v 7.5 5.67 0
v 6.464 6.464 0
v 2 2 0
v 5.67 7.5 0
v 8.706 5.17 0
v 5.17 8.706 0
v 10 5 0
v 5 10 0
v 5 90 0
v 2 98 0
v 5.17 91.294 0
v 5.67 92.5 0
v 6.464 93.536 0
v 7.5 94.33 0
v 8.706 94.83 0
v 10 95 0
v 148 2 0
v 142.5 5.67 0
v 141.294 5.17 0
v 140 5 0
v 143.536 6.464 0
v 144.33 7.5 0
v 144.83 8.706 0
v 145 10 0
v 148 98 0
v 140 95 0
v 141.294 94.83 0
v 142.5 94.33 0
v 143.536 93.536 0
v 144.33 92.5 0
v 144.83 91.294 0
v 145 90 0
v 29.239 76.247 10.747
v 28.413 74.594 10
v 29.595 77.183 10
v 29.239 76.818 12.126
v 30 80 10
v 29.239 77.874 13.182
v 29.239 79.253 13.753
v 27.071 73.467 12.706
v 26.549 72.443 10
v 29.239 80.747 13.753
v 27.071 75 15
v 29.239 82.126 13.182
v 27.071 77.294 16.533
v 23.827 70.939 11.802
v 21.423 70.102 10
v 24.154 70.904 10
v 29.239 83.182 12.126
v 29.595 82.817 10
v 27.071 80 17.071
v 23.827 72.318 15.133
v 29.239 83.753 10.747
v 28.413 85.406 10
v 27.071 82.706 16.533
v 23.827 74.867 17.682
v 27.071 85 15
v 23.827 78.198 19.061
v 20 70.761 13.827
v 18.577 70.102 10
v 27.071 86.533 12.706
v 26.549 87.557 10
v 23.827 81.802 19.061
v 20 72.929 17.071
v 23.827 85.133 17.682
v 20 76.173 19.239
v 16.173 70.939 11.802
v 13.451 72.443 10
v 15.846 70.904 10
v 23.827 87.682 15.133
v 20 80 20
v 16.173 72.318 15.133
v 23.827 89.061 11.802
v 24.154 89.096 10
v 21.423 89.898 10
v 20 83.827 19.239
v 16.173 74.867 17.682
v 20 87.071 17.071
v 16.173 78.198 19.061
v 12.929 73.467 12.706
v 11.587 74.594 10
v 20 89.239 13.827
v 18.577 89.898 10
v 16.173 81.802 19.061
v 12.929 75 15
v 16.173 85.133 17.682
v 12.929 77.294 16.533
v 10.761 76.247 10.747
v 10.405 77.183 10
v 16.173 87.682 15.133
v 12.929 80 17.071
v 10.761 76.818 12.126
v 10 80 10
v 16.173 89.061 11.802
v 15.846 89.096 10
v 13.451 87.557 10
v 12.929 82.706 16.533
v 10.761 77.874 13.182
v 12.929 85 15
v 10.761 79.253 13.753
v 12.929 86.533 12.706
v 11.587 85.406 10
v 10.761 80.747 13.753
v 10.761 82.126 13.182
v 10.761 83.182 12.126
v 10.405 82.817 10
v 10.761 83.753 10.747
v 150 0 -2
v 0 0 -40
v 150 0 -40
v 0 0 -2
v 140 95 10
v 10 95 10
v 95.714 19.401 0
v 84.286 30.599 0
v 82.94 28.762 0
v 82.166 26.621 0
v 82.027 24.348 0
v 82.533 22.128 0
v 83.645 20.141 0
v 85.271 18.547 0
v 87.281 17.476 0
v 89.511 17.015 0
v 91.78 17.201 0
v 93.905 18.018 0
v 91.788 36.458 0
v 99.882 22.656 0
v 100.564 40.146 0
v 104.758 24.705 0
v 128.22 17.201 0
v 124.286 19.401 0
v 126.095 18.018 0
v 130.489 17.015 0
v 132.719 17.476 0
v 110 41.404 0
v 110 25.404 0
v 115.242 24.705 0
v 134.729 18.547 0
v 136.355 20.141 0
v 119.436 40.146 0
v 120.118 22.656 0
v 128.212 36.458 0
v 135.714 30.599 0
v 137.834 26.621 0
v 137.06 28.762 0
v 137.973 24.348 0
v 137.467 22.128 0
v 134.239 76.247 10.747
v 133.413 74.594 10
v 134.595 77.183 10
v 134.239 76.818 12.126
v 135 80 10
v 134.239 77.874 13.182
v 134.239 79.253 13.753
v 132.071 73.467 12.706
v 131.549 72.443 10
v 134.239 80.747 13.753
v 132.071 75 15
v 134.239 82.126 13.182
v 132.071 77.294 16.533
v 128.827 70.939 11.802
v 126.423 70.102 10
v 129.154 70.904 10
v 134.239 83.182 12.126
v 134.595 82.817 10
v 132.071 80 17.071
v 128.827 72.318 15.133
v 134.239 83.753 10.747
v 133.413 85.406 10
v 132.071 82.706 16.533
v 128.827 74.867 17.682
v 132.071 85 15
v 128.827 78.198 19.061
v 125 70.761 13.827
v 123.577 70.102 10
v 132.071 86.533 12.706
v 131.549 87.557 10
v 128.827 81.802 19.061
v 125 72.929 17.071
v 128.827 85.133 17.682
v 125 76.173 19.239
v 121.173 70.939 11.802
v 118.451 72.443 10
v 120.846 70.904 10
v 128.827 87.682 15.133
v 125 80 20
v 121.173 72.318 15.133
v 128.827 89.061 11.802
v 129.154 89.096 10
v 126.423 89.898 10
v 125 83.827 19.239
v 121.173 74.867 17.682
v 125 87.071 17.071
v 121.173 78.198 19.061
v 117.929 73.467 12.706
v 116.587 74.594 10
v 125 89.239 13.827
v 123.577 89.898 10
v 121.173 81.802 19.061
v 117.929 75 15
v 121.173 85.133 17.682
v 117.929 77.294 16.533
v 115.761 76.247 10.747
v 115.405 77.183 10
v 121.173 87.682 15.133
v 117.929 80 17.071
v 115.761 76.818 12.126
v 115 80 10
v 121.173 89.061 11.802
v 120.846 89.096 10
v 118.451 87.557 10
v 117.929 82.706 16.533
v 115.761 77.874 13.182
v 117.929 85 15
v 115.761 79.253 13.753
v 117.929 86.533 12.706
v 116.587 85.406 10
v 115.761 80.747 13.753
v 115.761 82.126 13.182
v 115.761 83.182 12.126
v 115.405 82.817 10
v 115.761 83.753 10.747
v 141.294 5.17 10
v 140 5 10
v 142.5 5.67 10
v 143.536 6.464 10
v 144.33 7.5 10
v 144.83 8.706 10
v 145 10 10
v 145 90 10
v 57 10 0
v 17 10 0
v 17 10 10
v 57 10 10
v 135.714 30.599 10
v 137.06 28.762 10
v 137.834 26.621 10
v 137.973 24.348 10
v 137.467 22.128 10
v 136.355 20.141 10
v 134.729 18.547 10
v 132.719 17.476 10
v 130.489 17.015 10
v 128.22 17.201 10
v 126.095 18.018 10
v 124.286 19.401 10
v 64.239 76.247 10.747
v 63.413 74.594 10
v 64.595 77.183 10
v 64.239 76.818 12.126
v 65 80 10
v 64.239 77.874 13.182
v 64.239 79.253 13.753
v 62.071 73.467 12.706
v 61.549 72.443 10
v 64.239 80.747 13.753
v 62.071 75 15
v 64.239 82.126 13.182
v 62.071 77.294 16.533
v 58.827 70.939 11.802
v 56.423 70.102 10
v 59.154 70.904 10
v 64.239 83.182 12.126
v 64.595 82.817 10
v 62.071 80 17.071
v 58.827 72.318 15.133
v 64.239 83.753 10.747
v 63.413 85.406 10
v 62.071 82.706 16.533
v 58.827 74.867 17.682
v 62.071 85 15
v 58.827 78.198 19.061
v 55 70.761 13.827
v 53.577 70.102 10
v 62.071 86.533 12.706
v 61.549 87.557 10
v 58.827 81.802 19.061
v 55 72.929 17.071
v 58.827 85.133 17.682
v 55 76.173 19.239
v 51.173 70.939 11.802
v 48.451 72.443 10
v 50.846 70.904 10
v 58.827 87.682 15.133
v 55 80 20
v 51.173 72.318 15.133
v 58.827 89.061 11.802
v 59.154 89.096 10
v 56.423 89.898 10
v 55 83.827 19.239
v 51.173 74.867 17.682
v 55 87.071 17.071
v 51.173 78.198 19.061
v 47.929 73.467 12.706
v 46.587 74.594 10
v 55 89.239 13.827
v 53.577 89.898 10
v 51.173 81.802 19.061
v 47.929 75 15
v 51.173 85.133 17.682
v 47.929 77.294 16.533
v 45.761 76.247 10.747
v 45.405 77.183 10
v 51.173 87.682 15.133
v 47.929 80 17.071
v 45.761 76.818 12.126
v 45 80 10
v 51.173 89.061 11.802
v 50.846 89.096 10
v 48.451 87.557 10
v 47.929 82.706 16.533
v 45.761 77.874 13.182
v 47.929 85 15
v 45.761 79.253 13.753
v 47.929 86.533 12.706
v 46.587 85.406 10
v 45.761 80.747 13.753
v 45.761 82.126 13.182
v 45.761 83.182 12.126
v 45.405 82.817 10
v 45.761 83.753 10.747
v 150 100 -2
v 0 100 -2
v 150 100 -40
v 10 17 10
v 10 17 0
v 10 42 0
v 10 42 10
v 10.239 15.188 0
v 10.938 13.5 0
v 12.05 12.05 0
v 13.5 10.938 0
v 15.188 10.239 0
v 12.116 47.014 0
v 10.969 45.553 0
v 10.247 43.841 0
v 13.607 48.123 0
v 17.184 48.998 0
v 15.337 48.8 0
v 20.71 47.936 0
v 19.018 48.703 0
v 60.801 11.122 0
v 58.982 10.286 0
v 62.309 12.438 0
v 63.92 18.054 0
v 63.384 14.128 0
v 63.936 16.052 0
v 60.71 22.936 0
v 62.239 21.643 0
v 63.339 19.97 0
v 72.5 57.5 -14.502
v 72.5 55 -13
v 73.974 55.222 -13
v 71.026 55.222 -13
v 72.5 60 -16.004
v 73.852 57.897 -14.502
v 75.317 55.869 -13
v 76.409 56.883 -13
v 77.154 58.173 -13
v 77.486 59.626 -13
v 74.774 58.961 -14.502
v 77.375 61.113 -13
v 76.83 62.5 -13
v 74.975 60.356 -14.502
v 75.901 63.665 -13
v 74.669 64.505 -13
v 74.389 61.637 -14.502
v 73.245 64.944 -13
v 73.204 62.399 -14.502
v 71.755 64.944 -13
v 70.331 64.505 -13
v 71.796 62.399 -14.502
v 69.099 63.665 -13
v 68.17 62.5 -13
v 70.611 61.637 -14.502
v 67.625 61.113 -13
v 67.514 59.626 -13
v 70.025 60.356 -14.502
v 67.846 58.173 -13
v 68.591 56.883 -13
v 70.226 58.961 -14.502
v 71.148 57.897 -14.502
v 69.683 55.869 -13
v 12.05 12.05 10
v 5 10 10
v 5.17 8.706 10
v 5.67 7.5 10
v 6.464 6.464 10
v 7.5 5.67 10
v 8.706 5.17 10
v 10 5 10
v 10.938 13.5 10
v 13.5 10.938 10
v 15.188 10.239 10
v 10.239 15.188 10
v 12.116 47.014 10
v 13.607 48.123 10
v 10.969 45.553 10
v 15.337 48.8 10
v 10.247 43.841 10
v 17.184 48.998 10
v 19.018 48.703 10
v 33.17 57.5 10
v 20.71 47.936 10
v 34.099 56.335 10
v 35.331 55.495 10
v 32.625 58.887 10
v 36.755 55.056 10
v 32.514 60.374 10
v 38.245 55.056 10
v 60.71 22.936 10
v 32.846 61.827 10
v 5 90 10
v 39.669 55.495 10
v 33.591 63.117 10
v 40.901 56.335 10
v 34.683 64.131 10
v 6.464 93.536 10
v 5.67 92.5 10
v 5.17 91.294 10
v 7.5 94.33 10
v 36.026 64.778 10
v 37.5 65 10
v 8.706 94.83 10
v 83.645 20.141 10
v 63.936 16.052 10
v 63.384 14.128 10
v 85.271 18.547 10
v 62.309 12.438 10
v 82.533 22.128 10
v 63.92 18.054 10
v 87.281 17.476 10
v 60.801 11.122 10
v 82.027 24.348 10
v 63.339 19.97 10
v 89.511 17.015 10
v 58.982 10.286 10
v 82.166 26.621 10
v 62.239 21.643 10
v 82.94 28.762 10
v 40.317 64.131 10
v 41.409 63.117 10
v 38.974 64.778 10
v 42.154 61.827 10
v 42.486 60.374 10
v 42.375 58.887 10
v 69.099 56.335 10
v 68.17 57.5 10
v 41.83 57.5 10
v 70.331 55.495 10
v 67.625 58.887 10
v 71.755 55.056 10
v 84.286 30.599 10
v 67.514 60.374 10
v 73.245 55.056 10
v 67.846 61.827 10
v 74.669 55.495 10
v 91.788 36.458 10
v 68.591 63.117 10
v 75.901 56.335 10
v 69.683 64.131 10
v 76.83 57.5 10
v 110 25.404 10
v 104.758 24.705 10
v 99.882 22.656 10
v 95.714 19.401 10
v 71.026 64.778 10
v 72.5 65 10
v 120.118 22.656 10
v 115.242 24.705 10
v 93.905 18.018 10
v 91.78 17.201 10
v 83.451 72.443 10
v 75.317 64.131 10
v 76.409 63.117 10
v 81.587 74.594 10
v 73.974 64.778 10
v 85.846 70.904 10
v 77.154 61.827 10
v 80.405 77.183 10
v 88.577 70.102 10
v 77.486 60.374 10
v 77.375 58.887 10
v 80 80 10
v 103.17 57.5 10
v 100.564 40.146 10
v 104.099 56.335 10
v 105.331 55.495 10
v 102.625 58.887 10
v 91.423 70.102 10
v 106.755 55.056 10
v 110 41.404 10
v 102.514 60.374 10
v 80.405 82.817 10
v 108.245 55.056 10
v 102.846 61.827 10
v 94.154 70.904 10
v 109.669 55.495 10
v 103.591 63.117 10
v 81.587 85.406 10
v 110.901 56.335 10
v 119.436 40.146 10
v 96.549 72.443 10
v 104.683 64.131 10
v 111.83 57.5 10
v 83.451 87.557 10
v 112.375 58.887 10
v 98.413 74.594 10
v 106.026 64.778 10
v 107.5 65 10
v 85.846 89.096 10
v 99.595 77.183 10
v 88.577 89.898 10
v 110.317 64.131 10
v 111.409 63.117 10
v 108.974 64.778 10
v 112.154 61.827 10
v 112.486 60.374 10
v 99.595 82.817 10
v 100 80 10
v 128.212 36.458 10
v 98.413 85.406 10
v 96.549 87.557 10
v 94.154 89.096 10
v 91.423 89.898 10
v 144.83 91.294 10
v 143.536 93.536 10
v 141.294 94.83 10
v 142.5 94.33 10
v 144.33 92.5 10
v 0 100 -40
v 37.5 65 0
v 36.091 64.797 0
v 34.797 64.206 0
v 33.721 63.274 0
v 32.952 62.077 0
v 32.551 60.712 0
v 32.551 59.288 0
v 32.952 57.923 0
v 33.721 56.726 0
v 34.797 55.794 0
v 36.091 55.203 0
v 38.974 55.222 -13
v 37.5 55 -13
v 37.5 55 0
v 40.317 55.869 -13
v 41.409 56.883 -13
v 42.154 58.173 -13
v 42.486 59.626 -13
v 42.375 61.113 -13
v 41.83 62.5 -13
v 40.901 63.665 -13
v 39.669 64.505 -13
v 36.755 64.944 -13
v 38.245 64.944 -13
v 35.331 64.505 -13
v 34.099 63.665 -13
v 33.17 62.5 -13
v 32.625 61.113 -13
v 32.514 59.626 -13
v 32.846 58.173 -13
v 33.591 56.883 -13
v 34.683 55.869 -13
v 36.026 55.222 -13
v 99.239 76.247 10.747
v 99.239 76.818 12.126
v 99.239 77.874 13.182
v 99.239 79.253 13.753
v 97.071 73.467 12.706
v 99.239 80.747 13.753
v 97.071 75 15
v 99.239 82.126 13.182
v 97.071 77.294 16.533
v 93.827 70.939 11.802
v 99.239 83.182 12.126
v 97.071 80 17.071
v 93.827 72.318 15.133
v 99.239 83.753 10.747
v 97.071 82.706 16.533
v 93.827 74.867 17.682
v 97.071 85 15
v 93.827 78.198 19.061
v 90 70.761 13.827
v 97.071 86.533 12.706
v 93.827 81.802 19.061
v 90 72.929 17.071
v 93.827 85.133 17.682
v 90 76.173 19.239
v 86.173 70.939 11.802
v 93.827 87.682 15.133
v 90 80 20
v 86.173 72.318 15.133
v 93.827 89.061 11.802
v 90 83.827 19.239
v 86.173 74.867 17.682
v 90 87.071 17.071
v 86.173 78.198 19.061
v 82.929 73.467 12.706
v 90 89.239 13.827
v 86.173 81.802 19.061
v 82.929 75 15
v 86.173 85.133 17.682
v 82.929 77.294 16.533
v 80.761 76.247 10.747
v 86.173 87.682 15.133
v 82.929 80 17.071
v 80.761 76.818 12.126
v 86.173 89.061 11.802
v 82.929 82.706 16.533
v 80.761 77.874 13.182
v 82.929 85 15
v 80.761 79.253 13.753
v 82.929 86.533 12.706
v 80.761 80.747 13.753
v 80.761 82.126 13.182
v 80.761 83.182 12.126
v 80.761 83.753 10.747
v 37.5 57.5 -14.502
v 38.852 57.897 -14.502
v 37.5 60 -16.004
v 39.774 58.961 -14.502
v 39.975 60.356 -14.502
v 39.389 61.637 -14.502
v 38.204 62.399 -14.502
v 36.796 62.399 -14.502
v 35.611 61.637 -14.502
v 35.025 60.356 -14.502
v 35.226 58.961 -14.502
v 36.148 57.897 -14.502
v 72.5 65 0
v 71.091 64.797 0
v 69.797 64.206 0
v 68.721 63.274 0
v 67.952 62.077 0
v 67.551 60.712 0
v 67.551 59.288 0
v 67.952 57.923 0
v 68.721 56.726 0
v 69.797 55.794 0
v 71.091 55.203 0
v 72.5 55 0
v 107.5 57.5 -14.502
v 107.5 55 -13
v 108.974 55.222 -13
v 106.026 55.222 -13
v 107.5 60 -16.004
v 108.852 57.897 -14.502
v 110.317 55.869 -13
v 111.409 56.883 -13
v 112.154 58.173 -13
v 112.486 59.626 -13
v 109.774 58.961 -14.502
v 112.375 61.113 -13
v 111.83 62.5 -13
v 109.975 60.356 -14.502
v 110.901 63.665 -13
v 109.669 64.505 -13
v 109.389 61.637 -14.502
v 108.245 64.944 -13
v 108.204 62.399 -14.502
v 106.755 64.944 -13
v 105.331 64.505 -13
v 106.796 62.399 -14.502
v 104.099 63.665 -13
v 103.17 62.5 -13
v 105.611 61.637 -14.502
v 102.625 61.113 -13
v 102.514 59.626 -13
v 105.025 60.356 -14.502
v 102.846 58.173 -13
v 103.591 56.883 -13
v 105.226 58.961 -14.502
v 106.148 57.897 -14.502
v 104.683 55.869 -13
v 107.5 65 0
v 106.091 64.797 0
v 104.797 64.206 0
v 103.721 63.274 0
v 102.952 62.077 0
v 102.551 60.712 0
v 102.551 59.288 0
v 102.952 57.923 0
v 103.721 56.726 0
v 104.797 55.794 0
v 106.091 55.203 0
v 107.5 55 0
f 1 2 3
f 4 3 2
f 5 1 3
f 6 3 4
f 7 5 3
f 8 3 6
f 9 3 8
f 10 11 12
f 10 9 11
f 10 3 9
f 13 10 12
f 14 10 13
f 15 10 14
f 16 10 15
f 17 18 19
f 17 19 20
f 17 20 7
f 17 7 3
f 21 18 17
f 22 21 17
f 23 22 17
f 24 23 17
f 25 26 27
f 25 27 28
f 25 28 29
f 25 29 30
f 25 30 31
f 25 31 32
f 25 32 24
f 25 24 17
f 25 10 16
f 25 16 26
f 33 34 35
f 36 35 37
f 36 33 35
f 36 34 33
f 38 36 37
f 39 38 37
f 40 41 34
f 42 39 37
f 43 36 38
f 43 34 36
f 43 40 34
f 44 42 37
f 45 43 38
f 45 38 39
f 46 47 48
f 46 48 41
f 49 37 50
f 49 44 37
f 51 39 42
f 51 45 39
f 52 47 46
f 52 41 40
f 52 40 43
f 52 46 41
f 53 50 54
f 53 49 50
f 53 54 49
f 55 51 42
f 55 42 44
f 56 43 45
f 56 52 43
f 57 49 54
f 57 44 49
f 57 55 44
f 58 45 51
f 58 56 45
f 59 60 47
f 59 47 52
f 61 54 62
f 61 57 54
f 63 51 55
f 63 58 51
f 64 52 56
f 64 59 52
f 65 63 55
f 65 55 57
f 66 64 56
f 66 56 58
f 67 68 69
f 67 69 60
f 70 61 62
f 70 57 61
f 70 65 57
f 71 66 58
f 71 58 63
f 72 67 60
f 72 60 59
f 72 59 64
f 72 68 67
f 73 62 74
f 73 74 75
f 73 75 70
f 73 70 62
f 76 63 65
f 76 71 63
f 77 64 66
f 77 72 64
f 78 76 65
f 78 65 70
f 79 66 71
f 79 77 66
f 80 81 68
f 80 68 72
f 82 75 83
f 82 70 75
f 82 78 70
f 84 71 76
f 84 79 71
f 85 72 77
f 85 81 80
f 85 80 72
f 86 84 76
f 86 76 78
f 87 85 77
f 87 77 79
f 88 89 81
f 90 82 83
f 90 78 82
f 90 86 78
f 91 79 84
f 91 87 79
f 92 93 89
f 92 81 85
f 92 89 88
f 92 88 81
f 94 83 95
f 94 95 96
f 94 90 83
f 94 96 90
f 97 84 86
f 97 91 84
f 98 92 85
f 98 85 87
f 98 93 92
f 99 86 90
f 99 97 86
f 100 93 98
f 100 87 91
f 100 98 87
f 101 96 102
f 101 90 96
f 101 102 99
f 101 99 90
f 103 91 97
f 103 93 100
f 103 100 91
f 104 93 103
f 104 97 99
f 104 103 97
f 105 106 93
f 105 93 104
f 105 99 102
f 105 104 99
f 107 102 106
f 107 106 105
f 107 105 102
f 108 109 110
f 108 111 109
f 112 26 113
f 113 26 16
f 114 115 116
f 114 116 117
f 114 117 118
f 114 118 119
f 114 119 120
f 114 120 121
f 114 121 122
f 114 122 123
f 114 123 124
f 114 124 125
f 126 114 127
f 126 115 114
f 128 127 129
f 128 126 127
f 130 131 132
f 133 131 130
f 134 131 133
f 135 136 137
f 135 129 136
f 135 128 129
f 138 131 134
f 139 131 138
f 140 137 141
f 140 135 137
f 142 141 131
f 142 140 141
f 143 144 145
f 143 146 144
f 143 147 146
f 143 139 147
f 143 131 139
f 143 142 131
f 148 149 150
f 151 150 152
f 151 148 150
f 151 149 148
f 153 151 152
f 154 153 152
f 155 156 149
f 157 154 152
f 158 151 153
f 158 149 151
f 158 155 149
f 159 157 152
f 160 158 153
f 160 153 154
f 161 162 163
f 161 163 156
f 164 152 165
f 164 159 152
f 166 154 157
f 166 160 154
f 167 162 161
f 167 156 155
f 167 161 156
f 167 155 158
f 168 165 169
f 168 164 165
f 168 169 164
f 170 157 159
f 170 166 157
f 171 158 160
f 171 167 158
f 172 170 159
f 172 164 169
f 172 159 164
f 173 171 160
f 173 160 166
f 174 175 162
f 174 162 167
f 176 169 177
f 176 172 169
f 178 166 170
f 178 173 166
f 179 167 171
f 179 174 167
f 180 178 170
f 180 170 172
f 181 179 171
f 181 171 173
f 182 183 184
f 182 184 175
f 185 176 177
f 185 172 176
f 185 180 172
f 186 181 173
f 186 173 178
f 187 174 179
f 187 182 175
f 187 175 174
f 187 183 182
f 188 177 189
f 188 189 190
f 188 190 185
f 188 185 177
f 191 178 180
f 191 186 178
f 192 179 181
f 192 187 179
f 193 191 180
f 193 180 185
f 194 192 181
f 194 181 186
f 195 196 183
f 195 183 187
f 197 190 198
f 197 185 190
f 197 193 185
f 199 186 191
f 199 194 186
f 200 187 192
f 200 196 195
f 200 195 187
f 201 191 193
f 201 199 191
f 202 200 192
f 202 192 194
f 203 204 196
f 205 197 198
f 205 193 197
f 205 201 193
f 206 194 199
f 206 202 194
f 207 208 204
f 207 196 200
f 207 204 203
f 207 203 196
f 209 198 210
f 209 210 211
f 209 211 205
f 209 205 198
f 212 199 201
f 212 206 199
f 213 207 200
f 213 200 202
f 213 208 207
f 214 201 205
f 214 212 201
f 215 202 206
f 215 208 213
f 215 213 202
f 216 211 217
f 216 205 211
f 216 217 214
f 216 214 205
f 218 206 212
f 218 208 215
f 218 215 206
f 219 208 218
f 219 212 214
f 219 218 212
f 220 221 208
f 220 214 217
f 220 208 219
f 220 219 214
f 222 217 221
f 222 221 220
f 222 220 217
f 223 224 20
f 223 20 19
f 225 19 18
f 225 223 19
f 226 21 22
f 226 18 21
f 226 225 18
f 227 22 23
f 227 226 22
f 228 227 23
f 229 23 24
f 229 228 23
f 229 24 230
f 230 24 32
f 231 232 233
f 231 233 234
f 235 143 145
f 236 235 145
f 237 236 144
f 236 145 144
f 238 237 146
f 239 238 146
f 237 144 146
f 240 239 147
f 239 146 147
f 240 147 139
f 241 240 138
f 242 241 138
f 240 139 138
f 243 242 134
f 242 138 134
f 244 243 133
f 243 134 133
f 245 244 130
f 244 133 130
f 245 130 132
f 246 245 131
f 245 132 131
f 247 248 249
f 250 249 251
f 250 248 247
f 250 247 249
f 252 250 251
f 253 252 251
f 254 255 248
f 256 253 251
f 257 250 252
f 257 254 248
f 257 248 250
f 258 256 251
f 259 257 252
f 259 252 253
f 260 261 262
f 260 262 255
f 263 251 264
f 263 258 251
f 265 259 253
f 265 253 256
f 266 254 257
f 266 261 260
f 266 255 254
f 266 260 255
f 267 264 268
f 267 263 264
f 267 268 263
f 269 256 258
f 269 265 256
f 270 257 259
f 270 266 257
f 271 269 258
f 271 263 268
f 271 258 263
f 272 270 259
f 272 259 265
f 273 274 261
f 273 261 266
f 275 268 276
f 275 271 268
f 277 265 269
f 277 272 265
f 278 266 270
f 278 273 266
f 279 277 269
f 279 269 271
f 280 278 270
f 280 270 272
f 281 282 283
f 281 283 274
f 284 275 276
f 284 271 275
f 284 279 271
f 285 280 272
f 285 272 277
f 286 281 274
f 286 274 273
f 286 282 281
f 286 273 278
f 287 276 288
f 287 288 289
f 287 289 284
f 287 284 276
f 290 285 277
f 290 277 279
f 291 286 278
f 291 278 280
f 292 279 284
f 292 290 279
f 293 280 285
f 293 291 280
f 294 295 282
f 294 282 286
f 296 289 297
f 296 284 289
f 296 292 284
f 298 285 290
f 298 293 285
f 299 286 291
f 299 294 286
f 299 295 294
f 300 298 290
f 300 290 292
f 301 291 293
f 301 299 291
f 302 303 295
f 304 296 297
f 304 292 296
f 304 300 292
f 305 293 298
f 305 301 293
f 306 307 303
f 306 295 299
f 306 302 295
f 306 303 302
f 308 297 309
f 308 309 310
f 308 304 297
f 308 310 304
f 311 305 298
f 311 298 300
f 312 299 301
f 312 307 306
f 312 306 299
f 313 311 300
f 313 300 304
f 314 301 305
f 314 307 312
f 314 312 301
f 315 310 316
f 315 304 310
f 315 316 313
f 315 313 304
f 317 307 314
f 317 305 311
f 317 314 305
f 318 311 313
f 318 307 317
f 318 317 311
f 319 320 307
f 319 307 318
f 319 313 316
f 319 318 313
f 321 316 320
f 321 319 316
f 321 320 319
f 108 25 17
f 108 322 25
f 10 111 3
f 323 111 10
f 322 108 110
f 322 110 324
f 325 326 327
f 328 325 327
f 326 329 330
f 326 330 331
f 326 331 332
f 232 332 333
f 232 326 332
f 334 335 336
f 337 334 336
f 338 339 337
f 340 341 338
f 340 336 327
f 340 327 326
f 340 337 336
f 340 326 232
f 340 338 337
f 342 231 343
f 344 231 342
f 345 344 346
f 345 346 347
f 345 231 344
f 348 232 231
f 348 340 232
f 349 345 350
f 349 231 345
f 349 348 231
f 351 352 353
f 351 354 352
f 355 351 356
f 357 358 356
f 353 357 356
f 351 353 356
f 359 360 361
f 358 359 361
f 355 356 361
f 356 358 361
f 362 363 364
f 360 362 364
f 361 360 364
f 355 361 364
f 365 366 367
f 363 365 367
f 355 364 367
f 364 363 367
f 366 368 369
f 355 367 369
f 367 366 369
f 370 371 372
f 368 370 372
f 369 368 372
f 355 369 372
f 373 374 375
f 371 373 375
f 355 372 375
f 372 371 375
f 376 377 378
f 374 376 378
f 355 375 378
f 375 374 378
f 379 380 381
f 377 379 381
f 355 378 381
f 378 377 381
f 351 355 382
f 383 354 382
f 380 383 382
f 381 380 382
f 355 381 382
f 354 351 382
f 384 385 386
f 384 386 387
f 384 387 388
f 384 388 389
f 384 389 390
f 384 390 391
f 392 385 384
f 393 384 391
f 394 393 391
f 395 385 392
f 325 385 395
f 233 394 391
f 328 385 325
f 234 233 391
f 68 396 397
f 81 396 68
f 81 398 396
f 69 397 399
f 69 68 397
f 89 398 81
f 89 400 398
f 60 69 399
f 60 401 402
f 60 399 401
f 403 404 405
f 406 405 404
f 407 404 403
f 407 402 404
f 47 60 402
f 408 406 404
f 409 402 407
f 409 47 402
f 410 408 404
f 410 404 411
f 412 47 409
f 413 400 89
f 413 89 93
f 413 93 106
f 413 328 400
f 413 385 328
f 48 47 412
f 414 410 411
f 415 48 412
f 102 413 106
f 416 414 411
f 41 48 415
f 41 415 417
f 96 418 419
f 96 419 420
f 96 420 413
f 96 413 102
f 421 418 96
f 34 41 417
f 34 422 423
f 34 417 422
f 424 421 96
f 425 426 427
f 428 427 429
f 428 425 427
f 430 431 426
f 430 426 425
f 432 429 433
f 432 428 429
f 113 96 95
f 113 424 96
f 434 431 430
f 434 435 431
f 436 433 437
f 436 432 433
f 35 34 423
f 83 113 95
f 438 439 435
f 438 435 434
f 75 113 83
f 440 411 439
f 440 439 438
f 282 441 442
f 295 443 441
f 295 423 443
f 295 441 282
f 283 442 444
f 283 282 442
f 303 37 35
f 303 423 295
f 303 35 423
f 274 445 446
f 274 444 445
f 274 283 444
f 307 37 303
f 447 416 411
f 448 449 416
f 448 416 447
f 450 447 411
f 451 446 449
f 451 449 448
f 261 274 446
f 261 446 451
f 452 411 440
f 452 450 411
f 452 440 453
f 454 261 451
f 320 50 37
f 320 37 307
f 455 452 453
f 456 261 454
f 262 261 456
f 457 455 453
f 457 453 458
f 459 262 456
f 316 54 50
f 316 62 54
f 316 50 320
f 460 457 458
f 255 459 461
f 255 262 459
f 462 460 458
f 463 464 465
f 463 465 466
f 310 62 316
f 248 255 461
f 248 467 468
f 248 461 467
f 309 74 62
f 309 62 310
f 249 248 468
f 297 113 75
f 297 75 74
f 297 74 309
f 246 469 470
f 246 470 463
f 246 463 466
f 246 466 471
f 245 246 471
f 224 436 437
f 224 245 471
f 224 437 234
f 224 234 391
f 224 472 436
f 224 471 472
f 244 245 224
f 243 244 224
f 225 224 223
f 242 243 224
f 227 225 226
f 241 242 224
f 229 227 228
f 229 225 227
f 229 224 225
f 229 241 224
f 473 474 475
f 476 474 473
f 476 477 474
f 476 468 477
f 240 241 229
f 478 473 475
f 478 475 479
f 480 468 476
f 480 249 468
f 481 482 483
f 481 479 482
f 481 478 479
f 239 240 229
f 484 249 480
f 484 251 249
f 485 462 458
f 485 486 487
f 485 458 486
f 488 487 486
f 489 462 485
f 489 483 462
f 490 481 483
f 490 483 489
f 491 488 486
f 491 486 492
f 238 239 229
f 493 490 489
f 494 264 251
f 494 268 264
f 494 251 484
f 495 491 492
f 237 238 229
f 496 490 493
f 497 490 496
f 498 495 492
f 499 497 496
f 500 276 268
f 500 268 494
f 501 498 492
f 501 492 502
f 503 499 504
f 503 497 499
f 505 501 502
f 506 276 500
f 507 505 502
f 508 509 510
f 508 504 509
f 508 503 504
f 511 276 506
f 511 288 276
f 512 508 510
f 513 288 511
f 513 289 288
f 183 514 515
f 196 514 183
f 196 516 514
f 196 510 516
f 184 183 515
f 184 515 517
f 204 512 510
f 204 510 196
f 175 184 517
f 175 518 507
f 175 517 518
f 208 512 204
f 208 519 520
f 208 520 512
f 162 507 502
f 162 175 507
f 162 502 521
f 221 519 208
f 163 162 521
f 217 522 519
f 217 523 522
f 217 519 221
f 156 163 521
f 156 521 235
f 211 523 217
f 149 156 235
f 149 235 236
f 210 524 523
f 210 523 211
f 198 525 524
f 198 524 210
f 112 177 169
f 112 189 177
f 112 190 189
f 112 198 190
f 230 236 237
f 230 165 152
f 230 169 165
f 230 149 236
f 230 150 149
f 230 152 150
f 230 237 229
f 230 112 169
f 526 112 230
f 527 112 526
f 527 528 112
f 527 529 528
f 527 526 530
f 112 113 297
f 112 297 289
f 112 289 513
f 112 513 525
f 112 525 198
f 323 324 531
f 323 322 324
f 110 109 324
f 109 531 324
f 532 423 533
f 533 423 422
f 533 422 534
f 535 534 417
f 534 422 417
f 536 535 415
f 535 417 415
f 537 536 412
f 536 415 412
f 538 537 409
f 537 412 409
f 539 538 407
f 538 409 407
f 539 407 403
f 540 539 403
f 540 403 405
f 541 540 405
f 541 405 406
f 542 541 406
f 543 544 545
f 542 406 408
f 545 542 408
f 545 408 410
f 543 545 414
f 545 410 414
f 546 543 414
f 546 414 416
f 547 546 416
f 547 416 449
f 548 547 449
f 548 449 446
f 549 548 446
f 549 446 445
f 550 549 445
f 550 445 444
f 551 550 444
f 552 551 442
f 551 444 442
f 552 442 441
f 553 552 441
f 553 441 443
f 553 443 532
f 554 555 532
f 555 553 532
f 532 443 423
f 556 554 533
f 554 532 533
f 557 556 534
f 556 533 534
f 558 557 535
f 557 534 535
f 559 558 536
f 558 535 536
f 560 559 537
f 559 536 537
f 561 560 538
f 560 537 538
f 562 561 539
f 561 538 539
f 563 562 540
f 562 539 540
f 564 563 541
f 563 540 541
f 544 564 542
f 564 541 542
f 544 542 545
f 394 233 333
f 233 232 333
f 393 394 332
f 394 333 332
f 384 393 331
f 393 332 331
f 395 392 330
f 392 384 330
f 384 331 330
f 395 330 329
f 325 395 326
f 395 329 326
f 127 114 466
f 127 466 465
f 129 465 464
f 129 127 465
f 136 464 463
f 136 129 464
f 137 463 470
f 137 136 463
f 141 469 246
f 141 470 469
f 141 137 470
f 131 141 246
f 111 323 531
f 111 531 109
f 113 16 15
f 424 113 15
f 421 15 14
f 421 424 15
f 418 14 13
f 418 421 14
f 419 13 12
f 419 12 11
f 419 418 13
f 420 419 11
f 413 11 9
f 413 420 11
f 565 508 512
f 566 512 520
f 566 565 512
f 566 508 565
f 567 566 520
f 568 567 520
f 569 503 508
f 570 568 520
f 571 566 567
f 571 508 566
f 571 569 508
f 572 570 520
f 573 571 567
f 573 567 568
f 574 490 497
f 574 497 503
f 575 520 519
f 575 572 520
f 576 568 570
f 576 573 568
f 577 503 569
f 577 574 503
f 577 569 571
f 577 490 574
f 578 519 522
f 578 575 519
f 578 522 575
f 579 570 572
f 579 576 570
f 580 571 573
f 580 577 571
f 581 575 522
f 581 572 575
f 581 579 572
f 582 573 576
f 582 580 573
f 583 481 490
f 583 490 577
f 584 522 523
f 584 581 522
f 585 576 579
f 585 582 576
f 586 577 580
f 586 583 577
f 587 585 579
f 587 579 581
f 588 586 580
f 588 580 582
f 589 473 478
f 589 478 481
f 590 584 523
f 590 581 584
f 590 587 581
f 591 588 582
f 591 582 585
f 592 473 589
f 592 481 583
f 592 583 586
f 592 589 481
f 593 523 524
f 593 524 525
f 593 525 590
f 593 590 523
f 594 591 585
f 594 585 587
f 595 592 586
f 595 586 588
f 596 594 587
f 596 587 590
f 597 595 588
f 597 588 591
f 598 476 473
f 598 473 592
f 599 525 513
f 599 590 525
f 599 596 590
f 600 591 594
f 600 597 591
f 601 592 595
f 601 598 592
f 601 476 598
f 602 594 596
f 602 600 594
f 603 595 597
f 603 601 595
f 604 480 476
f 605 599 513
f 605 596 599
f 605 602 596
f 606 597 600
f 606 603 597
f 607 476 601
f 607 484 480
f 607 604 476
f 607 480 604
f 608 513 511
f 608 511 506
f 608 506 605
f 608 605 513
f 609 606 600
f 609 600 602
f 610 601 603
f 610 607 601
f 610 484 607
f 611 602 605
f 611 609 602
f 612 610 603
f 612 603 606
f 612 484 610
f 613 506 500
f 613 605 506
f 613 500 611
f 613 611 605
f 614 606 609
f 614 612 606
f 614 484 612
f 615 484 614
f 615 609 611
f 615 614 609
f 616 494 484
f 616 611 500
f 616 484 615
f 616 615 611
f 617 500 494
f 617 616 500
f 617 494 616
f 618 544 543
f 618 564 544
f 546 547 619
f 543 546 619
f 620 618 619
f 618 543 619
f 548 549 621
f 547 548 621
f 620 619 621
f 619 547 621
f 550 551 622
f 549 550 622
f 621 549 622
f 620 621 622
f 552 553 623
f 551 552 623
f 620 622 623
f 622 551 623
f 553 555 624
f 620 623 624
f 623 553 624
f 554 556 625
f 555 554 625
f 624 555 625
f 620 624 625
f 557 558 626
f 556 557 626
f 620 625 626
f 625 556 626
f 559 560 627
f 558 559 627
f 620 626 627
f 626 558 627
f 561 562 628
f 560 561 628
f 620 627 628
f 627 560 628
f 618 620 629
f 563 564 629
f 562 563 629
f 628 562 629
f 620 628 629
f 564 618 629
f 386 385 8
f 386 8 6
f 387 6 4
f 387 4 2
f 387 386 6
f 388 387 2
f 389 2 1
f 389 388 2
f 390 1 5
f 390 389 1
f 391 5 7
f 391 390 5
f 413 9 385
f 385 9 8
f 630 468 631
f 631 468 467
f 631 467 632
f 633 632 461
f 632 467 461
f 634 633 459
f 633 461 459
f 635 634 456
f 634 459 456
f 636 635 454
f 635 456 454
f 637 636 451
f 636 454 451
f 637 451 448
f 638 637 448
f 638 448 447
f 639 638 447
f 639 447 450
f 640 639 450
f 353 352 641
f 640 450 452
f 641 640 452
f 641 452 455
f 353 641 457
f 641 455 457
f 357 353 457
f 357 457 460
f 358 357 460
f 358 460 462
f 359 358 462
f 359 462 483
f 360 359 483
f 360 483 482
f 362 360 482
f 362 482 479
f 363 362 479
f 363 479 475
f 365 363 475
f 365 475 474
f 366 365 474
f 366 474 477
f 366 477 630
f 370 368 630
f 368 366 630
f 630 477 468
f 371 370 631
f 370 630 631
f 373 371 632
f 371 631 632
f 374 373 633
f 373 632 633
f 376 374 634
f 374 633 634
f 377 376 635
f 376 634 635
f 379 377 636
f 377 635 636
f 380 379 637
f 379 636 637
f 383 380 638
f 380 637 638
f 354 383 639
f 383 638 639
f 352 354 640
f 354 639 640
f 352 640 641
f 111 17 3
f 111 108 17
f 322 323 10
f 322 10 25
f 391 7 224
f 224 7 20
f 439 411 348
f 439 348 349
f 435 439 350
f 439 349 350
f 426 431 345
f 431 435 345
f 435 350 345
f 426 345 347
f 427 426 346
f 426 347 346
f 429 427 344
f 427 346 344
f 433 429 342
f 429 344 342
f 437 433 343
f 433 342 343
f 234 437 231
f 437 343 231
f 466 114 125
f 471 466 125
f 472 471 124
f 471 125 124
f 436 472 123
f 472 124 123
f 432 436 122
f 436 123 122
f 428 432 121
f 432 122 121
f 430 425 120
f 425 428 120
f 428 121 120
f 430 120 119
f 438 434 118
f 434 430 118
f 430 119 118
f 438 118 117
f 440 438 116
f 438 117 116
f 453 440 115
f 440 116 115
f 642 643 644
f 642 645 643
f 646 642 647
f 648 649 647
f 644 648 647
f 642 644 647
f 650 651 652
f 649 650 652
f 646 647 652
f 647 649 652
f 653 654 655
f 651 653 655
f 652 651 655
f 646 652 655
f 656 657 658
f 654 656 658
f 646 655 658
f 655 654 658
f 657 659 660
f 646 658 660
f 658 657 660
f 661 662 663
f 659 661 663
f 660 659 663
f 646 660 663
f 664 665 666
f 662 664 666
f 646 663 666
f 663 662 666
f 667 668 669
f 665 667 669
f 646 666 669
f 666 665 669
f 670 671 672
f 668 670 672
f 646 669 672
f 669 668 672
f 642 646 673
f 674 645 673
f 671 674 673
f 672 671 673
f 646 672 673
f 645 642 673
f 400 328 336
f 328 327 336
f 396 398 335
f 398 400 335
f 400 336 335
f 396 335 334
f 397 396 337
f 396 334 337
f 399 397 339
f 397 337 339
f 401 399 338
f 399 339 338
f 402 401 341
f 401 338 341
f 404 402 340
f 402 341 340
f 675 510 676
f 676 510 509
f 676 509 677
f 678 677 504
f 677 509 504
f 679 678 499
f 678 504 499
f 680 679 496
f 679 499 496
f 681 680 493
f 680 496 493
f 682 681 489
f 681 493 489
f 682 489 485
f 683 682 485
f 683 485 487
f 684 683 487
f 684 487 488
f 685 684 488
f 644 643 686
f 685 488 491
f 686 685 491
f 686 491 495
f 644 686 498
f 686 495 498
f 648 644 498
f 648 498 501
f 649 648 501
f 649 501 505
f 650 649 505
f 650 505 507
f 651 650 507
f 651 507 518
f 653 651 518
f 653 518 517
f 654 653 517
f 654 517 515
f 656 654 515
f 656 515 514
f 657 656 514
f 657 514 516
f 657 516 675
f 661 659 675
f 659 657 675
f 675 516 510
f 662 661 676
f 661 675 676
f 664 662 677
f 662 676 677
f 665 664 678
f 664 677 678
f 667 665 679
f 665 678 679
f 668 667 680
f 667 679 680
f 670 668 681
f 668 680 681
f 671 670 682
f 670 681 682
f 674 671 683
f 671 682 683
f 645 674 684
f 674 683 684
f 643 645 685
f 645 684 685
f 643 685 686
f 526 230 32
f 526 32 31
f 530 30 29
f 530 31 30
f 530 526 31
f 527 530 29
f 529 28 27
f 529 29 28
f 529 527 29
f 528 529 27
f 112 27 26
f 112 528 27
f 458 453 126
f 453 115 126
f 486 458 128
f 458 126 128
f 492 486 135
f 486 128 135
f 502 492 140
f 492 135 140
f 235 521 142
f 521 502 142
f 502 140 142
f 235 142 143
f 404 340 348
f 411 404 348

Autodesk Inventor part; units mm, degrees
ref_plane "YZ Plane" through (0, 0, 0) normal (1, 0, 0) x (0, 1, 0)
ref_plane "XZ Plane" through (0, 0, 0) normal (0, 1, 0) x (-1, 0, 0)
ref_plane "XY Plane" through (0, 0, 0) normal (0, 0, 1) x (1, 0, 0)
sketch "Sketch1" plane through (0, 0, 0) normal (0, 0, 1) x (1, 0, 0)
  line L0 (0, 0) -> (150, 0)
  line L1 (150, 0) -> (150, 100)
  line L2 (150, 100) -> (0, 100)
  line L3 (0, 100) -> (0, 0)
  line L4 (5, 5) -> (145, 5)
  line L5 (145, 5) -> (145, 95)
  line L6 (145, 95) -> (5, 95)
  line L7 (5, 95) -> (5, 5)
  circle A0 centre (37.5, 60) radius 5
  line L8 (5, 60) -> (145, 60) construction
  circle A1 centre (72.5, 60) radius 5
  circle A2 centre (107.5, 60) radius 5
  arc A3 (10, 17) -> (17, 10) centre (17, 17) ccw
  arc A4 (57, 10) -> (60.71, 22.936) centre (57, 17) ccw
  arc A5 (20.71, 47.936) -> (10, 42) centre (17, 42) ccw
  line L9 (17, 10) -> (57, 10)
  line L10 (20.71, 47.936) -> (60.71, 22.936)
  line L11 (10, 17) -> (10, 42)
  circle A6 centre (130, 25) radius 8
  circle A7 centre (90, 25) radius 8
  line L12 (90, 25) -> (145, 25) construction
  arc A8 (124.2857, 19.4012) -> (95.7143, 19.4012) centre (110, 5.4041) ccw
  arc A9 (90.0041, 5) -> (90.0154, 4.6201) centre (110, 5.4041) ccw
  arc A10 (135.7143, 30.5988) -> (84.2857, 30.5988) centre (110, 5.4041) ccw
  dimension "d0" = 150
  dimension "d1" = 100
  dimension "d2" = 140
  dimension "d19" = 35
  dimension "d25" = 17
  dimension "d26" = 17
  dimension "d28" = 40
  dimension "d30" = 25
  dimension "d31" = 16
  dimension "d32" = 25
  dimension "d33" = 20
  dimension "d34" = 40
  dimension "d35" = 25
  dimension "d102" = 5
  dimension "d103" = 5
  dimension "d104" = 40
  dimension "d106" = 37.5
  dimension "d107" = 10
  dimension "d108" = 20
  dimension "d109" = 5
  dimension "d111" = 36
  dimension "d112" = 7
  dimension "d113" = 7
  dimension "d115" = 16
  dimension "d116" = 10
  dimension "d120" = 47.1699
  dimension "d121" = 40
extrude "Extrusion1" add sketch "Sketch1" against normal blind 40 contours L3 L2 L1 L0 | L7 L6 L5 L4 | A0 | A1 | A2 | L11 A5 L10 A4 L9 A3 | A6 | A6 A8 A7 A10 | A7
extrude "Extrusion2" add sketch "Sketch1" along normal blind 10 contours L7 L6 L5 L4
extrude "Extrusion3" add sketch "Sketch1" along normal blind 10 contours A0 | A1 | A2
hole "Hole1" at (37.5, 60, 0) direction (0, 0, 1) diameter 10 end through all
hole "Hole2" at (72.5, 60, 0) direction (0, 0, 1) diameter 10 end through all
hole "Hole3" at (107.5, 60, 0) direction (0, 0, 1) diameter 10 end through all
hole "Hole4" at (37.5, 60, 0) direction (0, 0, -1) diameter 10 depth 13 tip angle 118
hole "Hole5" at (72.5, 60, 0) direction (0, 0, -1) diameter 10 depth 13 tip angle 118
hole "Hole6" at (107.5, 60, 0) direction (0, 0, -1) diameter 10 depth 13 tip angle 118
fillet "Fillet1" radius 5 1 edges at (145, 95, 5)
fillet "Fillet2" radius 5 3 edges at (5, 95, 5) (145, 5, 5) (5, 5, 5)
sketch "Sketch2" plane through (0, 0, 10) normal (0, 0, 1) x (1, 0, 0)
  arc A0 (30, 80) -> (10, 80) centre (20, 80) ccw
  line L0 (0, 100) -> (0, 0) projected
  line L1 (5, 10) -> (5, 90) construction
  line L2 (5, 80) -> (145, 80) construction
  line L3 (145, 90) -> (145, 10) construction
  line L4 (10, 80) -> (30, 80)
  arc A1 (65, 80) -> (45, 80) centre (55, 80) ccw
  line L5 (45, 80) -> (65, 80)
  arc A2 (100, 80) -> (80, 80) centre (90, 80) ccw
  line L6 (80, 80) -> (100, 80)
  arc A3 (135, 80) -> (115, 80) centre (125, 80) ccw
  line L7 (115, 80) -> (135, 80)
  dimension "d90" = 20
  dimension "d122" = 80
  dimension "d131" = 20
  dimension "d132" = 10
  dimension "d135" = 35
revolve "Revolution1" add sketch "Sketch2" angle 360 about axis through (5, 80, 10) along (1, 0, 0)
chamfer "Chamfer1" distance 2 angle 45 4 edges at (75, 100, 0) (150, 50, 0) (0, 50, 0) (75, 0, 0)
properties part number "tarefa 3"
